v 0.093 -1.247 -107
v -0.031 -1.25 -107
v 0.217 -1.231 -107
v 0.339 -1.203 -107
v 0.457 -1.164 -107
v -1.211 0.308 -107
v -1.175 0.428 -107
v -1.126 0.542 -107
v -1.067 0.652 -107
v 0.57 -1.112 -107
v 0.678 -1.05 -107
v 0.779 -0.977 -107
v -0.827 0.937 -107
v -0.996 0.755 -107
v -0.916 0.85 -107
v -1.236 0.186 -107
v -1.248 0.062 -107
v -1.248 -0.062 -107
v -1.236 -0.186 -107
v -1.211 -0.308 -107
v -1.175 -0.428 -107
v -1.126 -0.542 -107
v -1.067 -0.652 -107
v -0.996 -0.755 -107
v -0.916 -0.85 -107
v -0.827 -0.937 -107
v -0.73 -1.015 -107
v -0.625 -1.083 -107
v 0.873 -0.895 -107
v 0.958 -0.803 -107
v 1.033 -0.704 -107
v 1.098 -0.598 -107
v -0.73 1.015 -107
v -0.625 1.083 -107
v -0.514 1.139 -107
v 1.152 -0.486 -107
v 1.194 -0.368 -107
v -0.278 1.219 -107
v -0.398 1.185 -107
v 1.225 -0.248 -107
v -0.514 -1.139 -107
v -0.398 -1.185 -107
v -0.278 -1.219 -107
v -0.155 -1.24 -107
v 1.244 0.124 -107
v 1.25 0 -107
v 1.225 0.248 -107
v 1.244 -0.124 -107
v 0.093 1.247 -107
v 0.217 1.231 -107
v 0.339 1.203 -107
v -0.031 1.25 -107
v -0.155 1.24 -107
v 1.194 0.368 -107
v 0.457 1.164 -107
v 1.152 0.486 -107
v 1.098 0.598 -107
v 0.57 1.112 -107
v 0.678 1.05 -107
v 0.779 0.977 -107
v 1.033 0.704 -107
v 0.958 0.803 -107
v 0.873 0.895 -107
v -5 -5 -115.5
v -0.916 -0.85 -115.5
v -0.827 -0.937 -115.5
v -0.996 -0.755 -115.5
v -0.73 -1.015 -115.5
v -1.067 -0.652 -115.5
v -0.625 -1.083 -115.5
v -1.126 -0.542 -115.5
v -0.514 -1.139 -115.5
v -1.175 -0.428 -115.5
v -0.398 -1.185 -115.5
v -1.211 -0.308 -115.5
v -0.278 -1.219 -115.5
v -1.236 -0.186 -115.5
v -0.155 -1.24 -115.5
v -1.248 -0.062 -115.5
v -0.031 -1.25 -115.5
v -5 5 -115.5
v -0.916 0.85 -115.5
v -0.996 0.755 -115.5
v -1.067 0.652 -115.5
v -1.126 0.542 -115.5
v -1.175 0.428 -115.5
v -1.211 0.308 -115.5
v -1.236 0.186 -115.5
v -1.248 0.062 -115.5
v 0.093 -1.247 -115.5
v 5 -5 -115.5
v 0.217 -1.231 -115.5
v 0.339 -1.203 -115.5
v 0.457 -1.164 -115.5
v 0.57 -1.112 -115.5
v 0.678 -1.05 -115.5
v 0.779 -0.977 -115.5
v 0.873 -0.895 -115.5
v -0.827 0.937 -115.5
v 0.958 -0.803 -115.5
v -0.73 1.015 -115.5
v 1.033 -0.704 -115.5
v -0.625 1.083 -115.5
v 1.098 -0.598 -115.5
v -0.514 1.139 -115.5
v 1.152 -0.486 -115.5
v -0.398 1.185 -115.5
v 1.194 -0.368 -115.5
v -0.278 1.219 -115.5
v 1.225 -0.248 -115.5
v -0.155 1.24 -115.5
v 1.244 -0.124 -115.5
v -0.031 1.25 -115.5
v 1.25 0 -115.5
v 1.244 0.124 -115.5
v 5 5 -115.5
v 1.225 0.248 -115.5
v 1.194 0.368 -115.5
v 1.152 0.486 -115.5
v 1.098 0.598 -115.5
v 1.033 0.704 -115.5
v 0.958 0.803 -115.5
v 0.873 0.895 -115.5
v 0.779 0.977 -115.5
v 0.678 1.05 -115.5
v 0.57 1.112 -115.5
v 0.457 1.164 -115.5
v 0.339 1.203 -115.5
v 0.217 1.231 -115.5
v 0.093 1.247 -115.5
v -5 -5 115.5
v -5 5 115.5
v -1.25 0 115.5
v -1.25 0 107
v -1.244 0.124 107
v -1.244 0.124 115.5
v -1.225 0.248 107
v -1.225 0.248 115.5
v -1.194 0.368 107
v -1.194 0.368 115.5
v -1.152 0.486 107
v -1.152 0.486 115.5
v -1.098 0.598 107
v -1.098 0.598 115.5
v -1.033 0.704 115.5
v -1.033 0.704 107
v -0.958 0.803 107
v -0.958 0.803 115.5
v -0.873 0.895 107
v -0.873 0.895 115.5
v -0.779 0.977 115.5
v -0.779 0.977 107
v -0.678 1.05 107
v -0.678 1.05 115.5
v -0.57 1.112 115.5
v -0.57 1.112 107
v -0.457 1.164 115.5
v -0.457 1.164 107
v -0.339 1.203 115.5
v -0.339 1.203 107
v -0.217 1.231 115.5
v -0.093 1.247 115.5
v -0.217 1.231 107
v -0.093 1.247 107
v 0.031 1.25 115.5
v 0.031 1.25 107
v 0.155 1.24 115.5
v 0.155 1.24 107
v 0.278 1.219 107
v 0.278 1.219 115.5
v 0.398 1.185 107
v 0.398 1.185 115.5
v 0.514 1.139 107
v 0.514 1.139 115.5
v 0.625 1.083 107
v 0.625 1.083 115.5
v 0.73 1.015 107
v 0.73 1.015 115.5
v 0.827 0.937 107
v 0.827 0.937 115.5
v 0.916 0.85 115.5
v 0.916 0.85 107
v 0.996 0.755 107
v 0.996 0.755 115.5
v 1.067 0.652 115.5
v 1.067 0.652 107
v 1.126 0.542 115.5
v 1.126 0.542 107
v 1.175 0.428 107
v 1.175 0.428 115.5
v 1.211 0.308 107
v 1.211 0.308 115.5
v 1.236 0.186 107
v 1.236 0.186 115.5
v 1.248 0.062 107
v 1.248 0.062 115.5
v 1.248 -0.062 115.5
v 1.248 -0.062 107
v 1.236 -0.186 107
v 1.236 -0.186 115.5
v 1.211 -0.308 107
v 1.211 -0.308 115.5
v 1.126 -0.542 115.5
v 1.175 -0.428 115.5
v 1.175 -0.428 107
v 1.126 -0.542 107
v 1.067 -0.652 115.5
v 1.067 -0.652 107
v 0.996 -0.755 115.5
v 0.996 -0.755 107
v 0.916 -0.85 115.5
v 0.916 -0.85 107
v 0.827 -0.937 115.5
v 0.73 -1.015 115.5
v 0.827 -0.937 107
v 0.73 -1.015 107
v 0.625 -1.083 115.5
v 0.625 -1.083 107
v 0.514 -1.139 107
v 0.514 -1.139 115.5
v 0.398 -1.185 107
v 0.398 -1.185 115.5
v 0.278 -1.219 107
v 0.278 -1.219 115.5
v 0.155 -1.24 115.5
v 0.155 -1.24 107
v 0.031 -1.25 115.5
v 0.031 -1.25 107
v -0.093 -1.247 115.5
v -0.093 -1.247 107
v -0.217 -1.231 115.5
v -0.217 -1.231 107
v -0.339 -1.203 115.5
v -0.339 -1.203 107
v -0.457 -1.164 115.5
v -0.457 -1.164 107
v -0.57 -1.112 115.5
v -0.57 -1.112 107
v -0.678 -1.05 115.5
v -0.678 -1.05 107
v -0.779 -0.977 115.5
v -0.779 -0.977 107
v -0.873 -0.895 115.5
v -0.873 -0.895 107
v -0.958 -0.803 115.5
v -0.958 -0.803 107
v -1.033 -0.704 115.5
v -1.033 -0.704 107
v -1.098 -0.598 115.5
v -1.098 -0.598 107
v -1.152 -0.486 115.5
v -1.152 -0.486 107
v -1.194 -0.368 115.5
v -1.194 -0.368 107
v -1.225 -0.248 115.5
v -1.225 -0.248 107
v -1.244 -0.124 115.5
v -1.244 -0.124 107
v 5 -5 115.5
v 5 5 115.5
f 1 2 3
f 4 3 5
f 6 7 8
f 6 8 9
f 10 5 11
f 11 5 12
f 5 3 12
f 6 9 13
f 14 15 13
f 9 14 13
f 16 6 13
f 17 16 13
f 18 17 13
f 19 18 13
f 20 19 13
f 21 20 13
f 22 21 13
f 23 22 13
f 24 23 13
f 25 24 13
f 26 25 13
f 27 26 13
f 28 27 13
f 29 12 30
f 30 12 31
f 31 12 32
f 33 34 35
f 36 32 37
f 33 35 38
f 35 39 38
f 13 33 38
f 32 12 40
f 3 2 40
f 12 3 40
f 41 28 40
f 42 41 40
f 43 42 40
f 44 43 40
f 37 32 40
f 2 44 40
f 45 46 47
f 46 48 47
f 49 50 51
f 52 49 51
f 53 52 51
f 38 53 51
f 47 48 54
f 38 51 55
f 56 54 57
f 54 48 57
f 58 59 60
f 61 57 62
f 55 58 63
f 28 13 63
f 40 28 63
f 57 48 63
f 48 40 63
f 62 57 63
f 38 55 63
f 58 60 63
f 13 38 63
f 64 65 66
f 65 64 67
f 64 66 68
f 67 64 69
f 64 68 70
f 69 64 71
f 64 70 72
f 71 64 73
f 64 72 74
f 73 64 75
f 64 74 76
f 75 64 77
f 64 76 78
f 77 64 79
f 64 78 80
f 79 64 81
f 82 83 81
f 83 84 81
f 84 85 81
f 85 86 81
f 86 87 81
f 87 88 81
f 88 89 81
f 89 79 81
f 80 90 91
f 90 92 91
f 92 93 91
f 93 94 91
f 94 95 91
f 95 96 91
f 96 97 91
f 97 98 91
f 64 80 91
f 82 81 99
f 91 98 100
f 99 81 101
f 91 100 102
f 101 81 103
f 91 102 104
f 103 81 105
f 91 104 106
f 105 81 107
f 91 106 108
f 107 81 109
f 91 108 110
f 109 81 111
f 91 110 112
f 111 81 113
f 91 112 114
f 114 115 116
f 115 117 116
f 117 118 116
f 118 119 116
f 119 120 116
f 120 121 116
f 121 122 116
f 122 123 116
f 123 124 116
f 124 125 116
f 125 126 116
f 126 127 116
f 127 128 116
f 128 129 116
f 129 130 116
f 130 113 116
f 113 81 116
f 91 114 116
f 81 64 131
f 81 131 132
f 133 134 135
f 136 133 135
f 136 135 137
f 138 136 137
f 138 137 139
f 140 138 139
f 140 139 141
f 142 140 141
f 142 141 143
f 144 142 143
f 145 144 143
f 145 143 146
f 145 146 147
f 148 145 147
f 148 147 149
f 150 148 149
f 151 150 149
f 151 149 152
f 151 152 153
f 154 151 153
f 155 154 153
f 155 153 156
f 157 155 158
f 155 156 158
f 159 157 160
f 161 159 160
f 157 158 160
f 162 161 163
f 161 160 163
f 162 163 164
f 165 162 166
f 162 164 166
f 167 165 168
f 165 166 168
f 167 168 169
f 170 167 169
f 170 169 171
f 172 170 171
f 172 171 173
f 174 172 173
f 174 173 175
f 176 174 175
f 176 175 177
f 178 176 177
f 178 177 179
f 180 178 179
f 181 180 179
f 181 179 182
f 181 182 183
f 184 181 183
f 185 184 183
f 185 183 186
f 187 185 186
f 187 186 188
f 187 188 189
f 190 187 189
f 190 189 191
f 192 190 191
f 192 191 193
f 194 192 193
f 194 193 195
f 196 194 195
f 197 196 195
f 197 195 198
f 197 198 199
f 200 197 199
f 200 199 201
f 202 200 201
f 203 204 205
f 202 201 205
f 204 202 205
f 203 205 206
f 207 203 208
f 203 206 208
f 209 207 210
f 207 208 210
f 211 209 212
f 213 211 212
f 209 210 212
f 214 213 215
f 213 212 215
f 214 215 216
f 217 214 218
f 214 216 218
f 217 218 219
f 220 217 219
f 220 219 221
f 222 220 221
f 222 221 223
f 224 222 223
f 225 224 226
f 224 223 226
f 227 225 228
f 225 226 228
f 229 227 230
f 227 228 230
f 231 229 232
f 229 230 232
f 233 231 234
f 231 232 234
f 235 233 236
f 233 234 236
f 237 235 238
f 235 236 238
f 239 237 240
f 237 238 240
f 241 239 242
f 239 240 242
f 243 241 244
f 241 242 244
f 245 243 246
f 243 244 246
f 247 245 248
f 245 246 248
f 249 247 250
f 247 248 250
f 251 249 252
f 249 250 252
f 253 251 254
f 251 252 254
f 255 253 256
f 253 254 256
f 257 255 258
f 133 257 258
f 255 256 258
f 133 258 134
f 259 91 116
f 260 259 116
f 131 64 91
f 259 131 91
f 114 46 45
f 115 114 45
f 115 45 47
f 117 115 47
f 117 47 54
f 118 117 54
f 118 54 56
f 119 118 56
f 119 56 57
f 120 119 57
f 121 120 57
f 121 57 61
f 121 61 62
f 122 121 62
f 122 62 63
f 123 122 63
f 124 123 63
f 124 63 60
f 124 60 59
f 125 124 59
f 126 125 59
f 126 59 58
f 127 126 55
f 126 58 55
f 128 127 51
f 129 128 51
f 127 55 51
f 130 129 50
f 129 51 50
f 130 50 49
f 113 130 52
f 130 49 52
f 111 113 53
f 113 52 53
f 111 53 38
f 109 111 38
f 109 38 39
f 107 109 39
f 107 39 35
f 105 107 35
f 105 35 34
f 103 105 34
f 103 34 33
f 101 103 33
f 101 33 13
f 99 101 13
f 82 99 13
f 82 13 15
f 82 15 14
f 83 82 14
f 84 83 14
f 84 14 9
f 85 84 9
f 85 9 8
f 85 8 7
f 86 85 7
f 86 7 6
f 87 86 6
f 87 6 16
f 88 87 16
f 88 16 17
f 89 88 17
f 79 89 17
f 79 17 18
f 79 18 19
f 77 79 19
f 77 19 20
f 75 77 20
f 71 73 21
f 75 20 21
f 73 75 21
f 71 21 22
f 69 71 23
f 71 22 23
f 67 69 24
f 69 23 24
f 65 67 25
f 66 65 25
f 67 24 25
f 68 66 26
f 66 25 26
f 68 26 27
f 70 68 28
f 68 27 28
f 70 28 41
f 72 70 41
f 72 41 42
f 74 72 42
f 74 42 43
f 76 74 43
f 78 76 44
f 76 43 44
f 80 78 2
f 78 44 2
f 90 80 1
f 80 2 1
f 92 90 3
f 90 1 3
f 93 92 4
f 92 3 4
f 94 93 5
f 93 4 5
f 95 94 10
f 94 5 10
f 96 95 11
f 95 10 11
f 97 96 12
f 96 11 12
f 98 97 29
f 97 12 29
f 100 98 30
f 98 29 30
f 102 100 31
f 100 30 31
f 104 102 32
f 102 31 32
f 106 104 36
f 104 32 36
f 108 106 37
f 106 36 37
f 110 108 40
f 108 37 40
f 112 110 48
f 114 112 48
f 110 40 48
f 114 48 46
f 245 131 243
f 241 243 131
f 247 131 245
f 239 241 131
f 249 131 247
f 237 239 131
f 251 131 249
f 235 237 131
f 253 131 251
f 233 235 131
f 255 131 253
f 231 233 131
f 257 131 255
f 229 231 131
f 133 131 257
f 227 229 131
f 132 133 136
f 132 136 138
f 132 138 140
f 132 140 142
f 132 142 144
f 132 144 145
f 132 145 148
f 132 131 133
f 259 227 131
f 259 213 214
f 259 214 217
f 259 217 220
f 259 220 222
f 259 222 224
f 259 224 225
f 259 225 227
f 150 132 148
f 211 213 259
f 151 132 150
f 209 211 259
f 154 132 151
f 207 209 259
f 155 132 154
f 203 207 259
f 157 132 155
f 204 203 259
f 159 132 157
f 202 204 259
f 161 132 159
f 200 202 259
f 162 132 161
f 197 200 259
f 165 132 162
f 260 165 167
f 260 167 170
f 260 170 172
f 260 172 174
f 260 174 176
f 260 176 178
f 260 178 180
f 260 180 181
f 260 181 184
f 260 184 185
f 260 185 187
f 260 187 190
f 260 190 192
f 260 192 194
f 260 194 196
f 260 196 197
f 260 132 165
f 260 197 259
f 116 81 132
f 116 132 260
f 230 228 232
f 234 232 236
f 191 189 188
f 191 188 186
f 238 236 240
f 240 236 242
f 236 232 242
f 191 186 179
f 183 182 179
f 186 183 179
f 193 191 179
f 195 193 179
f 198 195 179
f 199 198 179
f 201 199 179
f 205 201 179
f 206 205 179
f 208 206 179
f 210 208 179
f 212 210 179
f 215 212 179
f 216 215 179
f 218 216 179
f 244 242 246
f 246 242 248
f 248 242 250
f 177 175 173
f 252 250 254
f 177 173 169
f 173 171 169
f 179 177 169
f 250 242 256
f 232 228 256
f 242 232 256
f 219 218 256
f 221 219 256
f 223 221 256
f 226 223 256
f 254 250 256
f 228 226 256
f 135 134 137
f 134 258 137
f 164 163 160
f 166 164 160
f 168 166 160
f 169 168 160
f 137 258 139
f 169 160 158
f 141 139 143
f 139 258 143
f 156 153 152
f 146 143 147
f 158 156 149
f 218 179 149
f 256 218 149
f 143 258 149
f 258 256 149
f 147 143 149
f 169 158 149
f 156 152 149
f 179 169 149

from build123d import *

# Parameters (mm, degrees)
BOSS_EXTRU_1_DEPTH        = 115.5
BOSS_EXTRU_1_DEPTH_BACK   = 115.5
ESQUISSE1_W               = 10
ESQUISSE1_H               = 10
TROU_TARAUD_M3X0_51_D     = 2.5
TROU_TARAUD_M3X0_51_DEPTH = 8.5
TROU_TARAUD_M3X0_52_D     = 2.5
TROU_TARAUD_M3X0_52_DEPTH = 8.5


with BuildPart() as part:
    # Esquisse1 → Boss.-Extru.1 (new, two sides: drawn at the far end of the back side and taken through both)
    with BuildSketch(Plane.XY.offset(-BOSS_EXTRU_1_DEPTH_BACK)):
        Rectangle(ESQUISSE1_W, ESQUISSE1_H)
    extrude(amount=BOSS_EXTRU_1_DEPTH + BOSS_EXTRU_1_DEPTH_BACK)

    # Trou taraudé M3x0.51
    with Locations(Plane.XY.offset(115.5)):
        with Locations((0, 0)):
            Hole(TROU_TARAUD_M3X0_51_D / 2, depth=TROU_TARAUD_M3X0_51_DEPTH)

    # Trou taraudé M3x0.52
    with Locations(Plane(origin=(0, 0, -115.5), x_dir=(-1, 0, 0), z_dir=(0, 0, -1))):
        with Locations((0, 0)):
            Hole(TROU_TARAUD_M3X0_52_D / 2, depth=TROU_TARAUD_M3X0_52_DEPTH)


solid = part.part
